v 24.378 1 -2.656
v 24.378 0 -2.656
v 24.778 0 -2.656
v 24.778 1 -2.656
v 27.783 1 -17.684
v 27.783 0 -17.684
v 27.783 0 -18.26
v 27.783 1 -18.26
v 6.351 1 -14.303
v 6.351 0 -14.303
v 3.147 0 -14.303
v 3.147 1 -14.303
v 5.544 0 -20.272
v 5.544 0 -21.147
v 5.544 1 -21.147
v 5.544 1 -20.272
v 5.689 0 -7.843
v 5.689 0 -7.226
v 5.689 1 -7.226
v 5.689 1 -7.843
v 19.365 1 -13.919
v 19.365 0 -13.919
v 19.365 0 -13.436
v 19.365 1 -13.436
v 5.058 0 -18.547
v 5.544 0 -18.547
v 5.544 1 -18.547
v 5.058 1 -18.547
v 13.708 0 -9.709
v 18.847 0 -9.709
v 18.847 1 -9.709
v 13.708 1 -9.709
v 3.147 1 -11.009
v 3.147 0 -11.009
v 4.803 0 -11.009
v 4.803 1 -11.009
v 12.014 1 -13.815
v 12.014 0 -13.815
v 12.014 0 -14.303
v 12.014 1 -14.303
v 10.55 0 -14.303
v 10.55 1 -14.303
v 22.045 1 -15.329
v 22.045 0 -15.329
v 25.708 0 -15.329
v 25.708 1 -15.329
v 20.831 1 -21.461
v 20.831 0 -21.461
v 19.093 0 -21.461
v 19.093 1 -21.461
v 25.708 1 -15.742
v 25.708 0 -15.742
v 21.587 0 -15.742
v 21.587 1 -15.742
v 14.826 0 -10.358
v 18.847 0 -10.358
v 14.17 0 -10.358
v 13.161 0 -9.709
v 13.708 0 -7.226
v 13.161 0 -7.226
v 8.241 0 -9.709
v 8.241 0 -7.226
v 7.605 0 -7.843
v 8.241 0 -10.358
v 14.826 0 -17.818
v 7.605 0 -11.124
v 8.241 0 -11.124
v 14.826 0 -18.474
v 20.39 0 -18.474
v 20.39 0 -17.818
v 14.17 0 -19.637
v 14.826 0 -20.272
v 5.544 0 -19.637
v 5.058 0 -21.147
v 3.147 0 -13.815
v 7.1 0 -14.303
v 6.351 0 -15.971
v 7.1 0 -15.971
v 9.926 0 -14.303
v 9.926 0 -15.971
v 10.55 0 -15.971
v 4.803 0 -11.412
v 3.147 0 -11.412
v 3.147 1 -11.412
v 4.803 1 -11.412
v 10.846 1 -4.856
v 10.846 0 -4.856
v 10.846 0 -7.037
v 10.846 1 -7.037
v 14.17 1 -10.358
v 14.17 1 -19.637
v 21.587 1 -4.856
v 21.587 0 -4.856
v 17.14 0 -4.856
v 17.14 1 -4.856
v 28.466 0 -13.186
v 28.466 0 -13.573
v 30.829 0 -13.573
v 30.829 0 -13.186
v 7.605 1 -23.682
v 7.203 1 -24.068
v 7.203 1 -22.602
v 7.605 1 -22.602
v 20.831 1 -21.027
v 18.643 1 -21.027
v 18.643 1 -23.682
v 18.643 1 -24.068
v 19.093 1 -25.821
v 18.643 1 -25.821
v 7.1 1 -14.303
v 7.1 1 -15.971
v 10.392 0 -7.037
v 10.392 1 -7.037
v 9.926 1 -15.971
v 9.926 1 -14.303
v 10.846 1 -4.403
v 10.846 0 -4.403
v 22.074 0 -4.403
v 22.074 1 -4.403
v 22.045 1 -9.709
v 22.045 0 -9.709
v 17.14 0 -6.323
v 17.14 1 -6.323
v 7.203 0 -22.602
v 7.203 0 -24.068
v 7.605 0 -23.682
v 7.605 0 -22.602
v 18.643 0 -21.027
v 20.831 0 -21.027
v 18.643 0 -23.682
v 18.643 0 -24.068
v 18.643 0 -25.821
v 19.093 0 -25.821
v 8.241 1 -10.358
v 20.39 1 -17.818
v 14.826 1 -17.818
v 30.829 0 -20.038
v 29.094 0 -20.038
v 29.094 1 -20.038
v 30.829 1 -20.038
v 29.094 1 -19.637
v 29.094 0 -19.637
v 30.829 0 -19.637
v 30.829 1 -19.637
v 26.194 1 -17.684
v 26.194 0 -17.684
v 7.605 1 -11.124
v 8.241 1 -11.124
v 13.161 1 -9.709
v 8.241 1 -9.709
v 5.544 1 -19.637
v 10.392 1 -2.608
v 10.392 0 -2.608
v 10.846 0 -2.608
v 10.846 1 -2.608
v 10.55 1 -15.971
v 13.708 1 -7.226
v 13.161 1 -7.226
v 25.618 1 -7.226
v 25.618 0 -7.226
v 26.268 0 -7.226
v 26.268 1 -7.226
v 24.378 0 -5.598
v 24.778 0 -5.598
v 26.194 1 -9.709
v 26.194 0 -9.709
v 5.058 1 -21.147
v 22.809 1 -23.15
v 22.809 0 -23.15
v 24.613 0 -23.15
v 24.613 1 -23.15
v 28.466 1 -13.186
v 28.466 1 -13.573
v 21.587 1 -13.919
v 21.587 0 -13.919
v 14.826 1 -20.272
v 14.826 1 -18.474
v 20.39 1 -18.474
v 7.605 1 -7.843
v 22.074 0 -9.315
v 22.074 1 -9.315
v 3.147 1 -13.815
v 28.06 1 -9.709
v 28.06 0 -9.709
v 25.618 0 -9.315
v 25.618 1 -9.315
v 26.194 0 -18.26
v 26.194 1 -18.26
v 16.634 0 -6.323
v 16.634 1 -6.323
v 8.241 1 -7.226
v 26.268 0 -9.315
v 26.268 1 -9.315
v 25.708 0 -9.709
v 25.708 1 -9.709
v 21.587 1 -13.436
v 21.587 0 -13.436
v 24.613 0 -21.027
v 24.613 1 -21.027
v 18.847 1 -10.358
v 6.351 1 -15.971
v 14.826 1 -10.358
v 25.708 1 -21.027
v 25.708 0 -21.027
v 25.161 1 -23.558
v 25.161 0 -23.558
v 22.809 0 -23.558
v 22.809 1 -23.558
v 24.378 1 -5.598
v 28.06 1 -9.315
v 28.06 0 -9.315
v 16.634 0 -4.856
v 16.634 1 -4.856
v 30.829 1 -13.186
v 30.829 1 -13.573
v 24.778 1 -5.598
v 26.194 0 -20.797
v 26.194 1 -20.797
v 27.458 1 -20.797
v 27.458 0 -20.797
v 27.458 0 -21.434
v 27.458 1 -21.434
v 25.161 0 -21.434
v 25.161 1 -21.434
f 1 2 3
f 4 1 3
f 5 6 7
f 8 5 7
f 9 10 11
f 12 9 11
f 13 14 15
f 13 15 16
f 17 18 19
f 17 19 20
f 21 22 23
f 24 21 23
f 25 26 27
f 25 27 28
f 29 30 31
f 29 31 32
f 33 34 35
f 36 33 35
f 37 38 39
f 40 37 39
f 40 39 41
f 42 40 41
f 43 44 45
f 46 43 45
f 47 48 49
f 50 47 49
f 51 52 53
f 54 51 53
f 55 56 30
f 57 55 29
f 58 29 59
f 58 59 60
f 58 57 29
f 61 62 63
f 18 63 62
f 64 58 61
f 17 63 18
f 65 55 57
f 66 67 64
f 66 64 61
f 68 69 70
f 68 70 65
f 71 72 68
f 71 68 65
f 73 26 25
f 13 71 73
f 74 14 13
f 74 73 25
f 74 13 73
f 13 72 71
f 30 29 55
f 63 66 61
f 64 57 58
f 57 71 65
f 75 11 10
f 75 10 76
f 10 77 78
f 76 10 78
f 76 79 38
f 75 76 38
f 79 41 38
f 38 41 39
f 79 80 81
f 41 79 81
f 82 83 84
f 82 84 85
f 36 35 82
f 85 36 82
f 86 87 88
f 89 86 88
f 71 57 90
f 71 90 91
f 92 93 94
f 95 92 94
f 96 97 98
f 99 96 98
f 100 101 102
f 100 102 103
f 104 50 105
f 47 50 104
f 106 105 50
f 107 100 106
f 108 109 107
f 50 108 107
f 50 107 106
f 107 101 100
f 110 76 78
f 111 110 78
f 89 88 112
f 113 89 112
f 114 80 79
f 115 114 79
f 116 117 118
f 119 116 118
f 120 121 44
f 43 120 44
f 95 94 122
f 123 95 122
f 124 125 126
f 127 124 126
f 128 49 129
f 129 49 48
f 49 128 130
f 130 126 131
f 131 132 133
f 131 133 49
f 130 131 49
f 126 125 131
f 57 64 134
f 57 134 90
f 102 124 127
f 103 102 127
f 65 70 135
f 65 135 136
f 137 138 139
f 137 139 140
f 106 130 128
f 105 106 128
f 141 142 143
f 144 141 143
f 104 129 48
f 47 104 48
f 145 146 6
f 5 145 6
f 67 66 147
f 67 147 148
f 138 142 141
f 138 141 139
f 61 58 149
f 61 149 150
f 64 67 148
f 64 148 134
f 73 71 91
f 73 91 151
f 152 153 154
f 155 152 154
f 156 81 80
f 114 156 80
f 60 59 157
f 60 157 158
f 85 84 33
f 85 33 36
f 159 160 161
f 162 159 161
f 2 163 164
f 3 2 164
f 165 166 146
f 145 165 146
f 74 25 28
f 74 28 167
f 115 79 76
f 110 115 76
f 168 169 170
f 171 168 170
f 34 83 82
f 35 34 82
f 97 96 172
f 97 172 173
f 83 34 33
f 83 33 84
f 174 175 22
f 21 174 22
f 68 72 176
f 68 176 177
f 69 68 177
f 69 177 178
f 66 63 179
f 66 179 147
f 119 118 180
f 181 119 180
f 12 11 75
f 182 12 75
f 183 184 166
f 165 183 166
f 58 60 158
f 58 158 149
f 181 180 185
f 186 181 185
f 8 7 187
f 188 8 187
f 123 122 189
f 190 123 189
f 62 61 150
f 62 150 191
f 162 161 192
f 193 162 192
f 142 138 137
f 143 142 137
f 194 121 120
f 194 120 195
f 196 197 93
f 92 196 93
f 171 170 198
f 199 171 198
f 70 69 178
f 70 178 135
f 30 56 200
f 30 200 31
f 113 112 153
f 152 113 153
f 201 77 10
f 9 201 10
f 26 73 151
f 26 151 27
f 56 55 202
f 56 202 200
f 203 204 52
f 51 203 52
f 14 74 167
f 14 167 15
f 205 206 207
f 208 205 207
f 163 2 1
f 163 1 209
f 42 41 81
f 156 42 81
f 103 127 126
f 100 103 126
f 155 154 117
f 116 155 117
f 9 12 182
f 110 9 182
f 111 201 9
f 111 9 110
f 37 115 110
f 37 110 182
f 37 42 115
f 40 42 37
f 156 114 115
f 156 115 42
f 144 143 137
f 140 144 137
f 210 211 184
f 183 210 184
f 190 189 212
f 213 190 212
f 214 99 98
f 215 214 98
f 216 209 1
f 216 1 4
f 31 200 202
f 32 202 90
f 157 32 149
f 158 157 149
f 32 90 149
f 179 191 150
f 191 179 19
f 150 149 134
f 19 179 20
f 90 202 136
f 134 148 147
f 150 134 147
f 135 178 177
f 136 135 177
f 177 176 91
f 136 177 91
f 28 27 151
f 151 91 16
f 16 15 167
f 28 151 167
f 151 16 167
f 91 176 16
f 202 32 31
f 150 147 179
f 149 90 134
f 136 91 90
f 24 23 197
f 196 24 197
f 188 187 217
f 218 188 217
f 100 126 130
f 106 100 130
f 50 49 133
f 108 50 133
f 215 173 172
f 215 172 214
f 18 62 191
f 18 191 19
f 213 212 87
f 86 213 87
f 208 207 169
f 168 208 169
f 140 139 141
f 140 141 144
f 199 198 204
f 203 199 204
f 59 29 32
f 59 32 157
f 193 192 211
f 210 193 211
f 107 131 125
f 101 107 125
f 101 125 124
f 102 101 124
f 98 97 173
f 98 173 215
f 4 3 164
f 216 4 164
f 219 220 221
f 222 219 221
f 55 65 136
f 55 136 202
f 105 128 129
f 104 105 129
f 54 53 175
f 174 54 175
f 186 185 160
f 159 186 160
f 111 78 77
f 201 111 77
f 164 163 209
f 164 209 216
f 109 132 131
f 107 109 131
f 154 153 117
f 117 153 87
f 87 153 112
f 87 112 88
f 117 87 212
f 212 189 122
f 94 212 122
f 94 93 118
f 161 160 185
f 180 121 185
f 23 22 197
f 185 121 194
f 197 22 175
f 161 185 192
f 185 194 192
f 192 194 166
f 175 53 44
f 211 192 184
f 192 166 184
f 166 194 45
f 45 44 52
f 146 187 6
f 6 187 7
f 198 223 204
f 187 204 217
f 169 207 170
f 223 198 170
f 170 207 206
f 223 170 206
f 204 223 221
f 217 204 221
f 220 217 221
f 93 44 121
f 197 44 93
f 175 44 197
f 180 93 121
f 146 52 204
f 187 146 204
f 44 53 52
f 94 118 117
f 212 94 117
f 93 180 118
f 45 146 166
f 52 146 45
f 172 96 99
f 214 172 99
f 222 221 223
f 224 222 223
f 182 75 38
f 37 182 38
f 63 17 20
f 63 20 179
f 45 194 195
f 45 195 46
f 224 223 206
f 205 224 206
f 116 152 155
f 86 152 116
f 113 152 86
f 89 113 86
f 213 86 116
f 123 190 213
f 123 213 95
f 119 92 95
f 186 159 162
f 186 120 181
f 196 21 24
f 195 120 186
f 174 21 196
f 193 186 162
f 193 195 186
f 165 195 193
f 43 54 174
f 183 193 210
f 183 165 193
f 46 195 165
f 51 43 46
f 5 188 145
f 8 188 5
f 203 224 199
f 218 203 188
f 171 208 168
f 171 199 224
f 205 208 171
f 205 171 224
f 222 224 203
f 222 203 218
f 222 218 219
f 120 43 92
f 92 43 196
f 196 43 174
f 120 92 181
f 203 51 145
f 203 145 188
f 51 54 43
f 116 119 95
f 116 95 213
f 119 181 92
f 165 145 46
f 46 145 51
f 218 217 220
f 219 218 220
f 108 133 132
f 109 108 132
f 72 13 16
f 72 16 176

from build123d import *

# Parameters (mm, degrees)
BOSS_EXTRUDE1_DEPTH   = 1
SKETCH2_W             = 1.656127113
SKETCH2_H             = 0.403523357
BOSS_EXTRUDE1_2_DEPTH = 1
SKETCH2_W_2           = 0.399793695
SKETCH2_H_2           = 2.942071549
BOSS_EXTRUDE1_3_DEPTH = 1
SKETCH2_W_3           = 2.362778432
SKETCH2_H_3           = 0.387177978
BOSS_EXTRUDE1_4_DEPTH = 1
SKETCH2_W_4           = 1.734085152
SKETCH2_H_4           = 0.400598673
BOSS_EXTRUDE1_5_DEPTH = 1
SKETCH2_W_5           = 3.663039273
SKETCH2_H_5           = 5.619427971
BOSS_EXTRUDE1_6_DEPTH = 1
BOSS_EXTRUDE1_7_DEPTH = 1
BOSS_EXTRUDE1_8_DEPTH = 1


with BuildPart() as part:
    # Sketch2 → Boss-Extrude1 (new body)
    with BuildSketch(Plane(origin=(0, 0, 0), x_dir=(1, 0, 0), z_dir=(0, 1, 0))):
        Polygon((7.605464492, 22.6024559), (7.605464492, 23.681549605), (18.642776244, 23.681549605), (18.642776244, 21.02680261), (20.830931343, 21.02680261), (20.830931343, 21.461215754), (19.093278764, 21.461215754), (19.093278764, 25.821436577), (18.642776244, 25.821436577), (18.642776244, 24.067694623), (7.203230099, 24.067694623), (7.203230099, 22.6024559), align=None)
    extrude(amount=BOSS_EXTRUDE1_DEPTH)


with BuildPart() as body_2:
    # Sketch2 → Boss-Extrude1 2 (new body)
    with BuildSketch(Plane(origin=(0, 0, 0), x_dir=(1, 0, 0), z_dir=(0, 1, 0))):
        with Locations((3.974889679, 11.210373468)):
            Rectangle(SKETCH2_W, SKETCH2_H)
    extrude(amount=BOSS_EXTRUDE1_2_DEPTH)


with BuildPart() as body_3:
    # Sketch2 → Boss-Extrude1 3 (new body)
    with BuildSketch(Plane(origin=(0, 0, 0), x_dir=(1, 0, 0), z_dir=(0, 1, 0))):
        with Locations((24.57835525, 4.126838364)):
            Rectangle(SKETCH2_W_2, SKETCH2_H_2)
    extrude(amount=BOSS_EXTRUDE1_3_DEPTH)


with BuildPart() as body_4:
    # Sketch2 → Boss-Extrude1 4 (new body)
    with BuildSketch(Plane(origin=(0, 0, 0), x_dir=(1, 0, 0), z_dir=(0, 1, 0))):
        with Locations((29.647117733, 13.379675947)):
            Rectangle(SKETCH2_W_3, SKETCH2_H_3)
    extrude(amount=BOSS_EXTRUDE1_4_DEPTH)


with BuildPart() as body_5:
    # Sketch2 → Boss-Extrude1 5 (new body)
    with BuildSketch(Plane(origin=(0, 0, 0), x_dir=(1, 0, 0), z_dir=(0, 1, 0))):
        with Locations((29.961464373, 19.837437698)):
            Rectangle(SKETCH2_W_4, SKETCH2_H_4)
    extrude(amount=BOSS_EXTRUDE1_5_DEPTH)


with BuildPart() as body_6:
    # Sketch2 → Boss-Extrude1 6 (new body)
    with BuildSketch(Plane(origin=(0, 0, 0), x_dir=(1, 0, 0), z_dir=(0, 1, 0))):
        Polygon((22.809474168, 23.557509364), (22.809474168, 23.15038634), (24.613450326, 23.15038634), (24.613450326, 21.02680261), (25.708470873, 21.02680261), (25.708470873, 15.741512218), (21.587019629, 15.741512218), (21.587019629, 13.918871592), (19.364896126, 13.918871592), (19.364896126, 13.436163116), (21.587019629, 13.436163116), (21.587019629, 4.855603822), (17.139697437, 4.855603822), (17.139697437, 6.322792074), (16.634051986, 6.322792074), (16.634051986, 4.855603822), (10.845878767, 4.855603822), (10.845878767, 7.036958249), (10.391792573, 7.036958249), (10.391792573, 2.607794633), (10.845878767, 2.607794633), (10.845878767, 4.403168883), (22.074048821, 4.403168883), (22.074048821, 9.315093548), (25.618199821, 9.315093548), (25.618199821, 7.226429154), (26.267823787, 7.226429154), (26.267823787, 9.315093548), (28.060457007, 9.315093548), (28.060457007, 9.709107862), (26.193815993, 9.709107862), (26.193815993, 17.683798541), (27.783305254, 17.683798541), (27.783305254, 18.260117173), (26.193815993, 18.260117173), (26.193815993, 20.797383382), (27.457794112, 20.797383382), (27.457794112, 21.434253008), (25.160960599, 21.434253008), (25.160960599, 23.557509364), align=None)
        with Locations((23.876951237, 12.518821847)):
            Rectangle(SKETCH2_W_5, SKETCH2_H_5, mode=Mode.SUBTRACT)
    extrude(amount=BOSS_EXTRUDE1_6_DEPTH)


with BuildPart() as body_7:
    # Sketch2 → Boss-Extrude1 7 (new body)
    with BuildSketch(Plane(origin=(0, 0, 0), x_dir=(1, 0, 0), z_dir=(0, 1, 0))):
        Polygon((5.057728665, 21.146716907), (5.543695939, 21.146716907), (5.543695939, 20.271975814), (14.825670872, 20.271975814), (14.825670872, 18.4738969), (20.389996159, 18.4738969), (20.389996159, 17.81784108), (14.825670872, 17.81784108), (14.825670872, 10.358243425), (18.847050064, 10.358243425), (18.847050064, 9.709107862), (13.707946142, 9.709107862), (13.707946142, 7.226429154), (13.161232959, 7.226429154), (13.161232959, 9.709107862), (8.24081431, 9.709107862), (8.24081431, 7.226429154), (5.689486122, 7.226429154), (5.689486122, 7.843362782), (7.605464492, 7.843362782), (7.605464492, 11.123641881), (8.24081431, 11.123641881), (8.24081431, 10.358243425), (14.169615052, 10.358243425), (14.169615052, 19.637138361), (5.543695939, 19.637138361), (5.543695939, 18.546791991), (5.057728665, 18.546791991), align=None)
    extrude(amount=BOSS_EXTRUDE1_7_DEPTH)


with BuildPart() as body_8:
    # Sketch2 → Boss-Extrude1 8 (new body)
    with BuildSketch(Plane(origin=(0, 0, 0), x_dir=(1, 0, 0), z_dir=(0, 1, 0))):
        Polygon((3.146826122, 13.815189626), (12.013776669, 13.815189626), (12.013776669, 14.303194592), (10.549761771, 14.303194592), (10.549761771, 15.971490638), (9.925569373, 15.971490638), (9.925569373, 14.303194592), (7.099680151, 14.303194592), (7.099680151, 15.971490638), (6.350649274, 15.971490638), (6.350649274, 14.303194592), (3.146826122, 14.303194592), align=None)
    extrude(amount=BOSS_EXTRUDE1_8_DEPTH)


solid = Compound([part.part, body_2.part, body_3.part, body_4.part, body_5.part, body_6.part, body_7.part, body_8.part])
